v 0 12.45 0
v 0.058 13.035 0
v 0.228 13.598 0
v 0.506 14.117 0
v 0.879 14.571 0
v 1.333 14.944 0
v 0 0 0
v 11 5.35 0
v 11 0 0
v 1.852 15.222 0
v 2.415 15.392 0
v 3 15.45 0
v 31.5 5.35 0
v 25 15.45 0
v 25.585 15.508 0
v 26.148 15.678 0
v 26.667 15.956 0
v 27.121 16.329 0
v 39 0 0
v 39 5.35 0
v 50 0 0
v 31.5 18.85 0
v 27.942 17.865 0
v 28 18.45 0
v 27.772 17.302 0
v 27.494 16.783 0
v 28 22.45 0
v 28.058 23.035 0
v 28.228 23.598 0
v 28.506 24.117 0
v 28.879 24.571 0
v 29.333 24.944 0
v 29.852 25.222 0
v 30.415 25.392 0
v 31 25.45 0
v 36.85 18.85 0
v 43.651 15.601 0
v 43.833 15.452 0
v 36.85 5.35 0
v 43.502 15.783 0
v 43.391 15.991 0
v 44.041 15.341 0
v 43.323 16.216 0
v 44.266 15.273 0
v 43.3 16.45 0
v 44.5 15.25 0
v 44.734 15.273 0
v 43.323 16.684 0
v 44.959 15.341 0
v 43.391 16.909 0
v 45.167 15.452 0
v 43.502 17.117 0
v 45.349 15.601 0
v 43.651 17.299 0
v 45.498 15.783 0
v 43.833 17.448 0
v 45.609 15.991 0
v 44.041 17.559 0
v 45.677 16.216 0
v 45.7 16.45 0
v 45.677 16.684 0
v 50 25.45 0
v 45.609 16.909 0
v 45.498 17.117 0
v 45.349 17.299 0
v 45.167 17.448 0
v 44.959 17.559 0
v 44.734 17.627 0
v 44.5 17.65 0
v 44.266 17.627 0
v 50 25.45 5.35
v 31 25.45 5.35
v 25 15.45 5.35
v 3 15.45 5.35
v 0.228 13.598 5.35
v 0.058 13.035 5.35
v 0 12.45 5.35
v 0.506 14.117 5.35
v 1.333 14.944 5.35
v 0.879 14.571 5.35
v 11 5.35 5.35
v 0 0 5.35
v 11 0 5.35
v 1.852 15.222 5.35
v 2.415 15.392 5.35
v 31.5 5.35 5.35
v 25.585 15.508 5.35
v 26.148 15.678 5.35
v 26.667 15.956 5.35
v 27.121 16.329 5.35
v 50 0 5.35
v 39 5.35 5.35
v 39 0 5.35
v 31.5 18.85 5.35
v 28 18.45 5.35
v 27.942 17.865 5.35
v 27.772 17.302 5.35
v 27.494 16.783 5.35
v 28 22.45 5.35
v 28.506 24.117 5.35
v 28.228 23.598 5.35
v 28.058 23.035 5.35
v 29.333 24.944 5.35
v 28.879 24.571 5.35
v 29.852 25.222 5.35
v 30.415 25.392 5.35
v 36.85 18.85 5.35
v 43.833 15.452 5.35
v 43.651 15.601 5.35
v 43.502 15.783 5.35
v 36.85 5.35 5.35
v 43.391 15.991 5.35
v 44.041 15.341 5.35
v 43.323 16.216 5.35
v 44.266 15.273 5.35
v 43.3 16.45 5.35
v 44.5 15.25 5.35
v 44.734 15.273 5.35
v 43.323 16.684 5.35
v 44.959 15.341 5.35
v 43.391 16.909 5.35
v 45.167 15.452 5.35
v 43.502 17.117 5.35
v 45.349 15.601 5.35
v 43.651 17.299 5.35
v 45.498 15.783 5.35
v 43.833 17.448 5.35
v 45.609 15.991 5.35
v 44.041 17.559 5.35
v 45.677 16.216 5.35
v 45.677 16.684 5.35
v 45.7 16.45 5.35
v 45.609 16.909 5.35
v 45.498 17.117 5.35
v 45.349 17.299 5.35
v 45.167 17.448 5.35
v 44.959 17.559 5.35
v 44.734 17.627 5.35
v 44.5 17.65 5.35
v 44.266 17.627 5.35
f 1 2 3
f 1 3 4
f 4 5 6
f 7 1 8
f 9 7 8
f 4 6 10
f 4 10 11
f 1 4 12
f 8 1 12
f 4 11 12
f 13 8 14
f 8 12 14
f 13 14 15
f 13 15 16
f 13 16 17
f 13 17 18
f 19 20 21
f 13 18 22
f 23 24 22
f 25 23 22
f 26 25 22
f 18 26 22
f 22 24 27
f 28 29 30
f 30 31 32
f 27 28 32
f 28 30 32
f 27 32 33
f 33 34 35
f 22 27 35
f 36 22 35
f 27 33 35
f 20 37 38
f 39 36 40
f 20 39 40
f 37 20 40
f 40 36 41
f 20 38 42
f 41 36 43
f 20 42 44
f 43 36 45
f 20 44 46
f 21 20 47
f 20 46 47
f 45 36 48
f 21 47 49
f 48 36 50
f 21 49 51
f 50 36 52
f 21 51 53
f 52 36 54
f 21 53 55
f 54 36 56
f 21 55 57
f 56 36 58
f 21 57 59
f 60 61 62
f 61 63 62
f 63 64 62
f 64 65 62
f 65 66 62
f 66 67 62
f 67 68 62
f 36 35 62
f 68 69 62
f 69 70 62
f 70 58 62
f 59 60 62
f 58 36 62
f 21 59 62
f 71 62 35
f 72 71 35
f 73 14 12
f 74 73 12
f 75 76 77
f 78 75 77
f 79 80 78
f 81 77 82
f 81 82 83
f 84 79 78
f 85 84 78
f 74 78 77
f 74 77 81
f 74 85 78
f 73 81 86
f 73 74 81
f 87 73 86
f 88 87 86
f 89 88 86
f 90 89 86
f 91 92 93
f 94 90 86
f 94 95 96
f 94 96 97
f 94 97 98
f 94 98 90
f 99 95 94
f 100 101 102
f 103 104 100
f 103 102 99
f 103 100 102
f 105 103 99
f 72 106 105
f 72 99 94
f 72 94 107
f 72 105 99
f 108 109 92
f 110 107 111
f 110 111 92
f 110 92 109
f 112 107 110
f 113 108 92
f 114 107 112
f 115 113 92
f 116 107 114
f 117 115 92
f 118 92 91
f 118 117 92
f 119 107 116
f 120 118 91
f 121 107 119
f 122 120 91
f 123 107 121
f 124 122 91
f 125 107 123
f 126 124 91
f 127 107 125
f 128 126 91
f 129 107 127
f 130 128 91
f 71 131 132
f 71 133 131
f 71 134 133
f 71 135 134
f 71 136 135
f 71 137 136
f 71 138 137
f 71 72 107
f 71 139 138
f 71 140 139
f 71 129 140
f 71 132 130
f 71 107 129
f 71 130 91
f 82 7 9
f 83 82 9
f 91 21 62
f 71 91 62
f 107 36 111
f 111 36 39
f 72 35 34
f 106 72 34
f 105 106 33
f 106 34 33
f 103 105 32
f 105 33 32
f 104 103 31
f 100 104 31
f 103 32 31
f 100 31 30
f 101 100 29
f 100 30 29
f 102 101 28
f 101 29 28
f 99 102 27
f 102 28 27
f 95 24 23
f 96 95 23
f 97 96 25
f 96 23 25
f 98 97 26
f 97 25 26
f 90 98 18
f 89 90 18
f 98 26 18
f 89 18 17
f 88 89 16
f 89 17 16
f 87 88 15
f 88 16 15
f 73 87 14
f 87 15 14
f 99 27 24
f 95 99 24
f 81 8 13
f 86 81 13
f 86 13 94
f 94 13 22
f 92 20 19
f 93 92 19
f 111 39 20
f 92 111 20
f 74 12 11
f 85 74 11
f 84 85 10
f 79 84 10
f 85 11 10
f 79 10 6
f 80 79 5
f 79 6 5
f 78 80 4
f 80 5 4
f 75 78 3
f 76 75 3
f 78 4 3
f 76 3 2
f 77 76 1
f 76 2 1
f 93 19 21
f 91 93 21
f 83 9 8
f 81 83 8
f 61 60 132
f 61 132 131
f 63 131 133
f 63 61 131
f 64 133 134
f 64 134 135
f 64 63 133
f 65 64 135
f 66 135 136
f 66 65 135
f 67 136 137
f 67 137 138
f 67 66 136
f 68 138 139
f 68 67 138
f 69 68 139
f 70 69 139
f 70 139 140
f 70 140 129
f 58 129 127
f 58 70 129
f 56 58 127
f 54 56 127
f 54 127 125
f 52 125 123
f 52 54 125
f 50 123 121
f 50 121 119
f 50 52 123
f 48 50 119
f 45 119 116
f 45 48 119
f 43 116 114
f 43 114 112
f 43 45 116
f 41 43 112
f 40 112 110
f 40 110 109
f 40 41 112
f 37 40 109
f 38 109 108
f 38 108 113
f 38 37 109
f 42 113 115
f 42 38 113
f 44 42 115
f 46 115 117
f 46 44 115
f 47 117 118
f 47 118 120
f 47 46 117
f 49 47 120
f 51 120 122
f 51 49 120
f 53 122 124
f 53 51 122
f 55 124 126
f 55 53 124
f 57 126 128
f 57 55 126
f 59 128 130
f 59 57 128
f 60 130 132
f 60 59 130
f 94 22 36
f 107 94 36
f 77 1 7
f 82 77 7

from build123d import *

# Parameters (mm, degrees)
MODEL_R             = 1.2
BOSS_EXTRUDE1_DEPTH = 5.35


with BuildPart() as part:
    # Model → Boss-Extrude1 (new body)
    with BuildSketch(Plane.XY):
        with BuildLine():
            Line((39, 0), (50, 0))
            Line((50, 0), (50, 25.45))
            Line((50, 25.45), (31, 25.45))
            ThreePointArc((31, 25.45), (28.878679656, 24.571320344), (28, 22.45))
            Line((28, 22.45), (28, 18.45))
            ThreePointArc((28, 18.45), (27.121320344, 16.328679656), (25, 15.45))
            Line((25, 15.45), (3, 15.45))
            ThreePointArc((3, 15.45), (0.878679656, 14.571320344), (0, 12.45))
            Line((0, 12.45), (0, 0))
            Line((0, 0), (11, 0))
            Line((11, 0), (11, 5.35))
            Line((11, 5.35), (31.5, 5.35))
            Line((31.5, 5.35), (31.5, 18.85))
            Line((31.5, 18.85), (36.85, 18.85))
            Line((36.85, 18.85), (36.85, 5.35))
            Line((36.85, 5.35), (39, 5.35))
            Line((39, 5.35), (39, 0))
        make_face()
        with Locations((44.5, 16.45)):
            Circle(MODEL_R, mode=Mode.SUBTRACT)
    extrude(amount=BOSS_EXTRUDE1_DEPTH)


solid = part.part
